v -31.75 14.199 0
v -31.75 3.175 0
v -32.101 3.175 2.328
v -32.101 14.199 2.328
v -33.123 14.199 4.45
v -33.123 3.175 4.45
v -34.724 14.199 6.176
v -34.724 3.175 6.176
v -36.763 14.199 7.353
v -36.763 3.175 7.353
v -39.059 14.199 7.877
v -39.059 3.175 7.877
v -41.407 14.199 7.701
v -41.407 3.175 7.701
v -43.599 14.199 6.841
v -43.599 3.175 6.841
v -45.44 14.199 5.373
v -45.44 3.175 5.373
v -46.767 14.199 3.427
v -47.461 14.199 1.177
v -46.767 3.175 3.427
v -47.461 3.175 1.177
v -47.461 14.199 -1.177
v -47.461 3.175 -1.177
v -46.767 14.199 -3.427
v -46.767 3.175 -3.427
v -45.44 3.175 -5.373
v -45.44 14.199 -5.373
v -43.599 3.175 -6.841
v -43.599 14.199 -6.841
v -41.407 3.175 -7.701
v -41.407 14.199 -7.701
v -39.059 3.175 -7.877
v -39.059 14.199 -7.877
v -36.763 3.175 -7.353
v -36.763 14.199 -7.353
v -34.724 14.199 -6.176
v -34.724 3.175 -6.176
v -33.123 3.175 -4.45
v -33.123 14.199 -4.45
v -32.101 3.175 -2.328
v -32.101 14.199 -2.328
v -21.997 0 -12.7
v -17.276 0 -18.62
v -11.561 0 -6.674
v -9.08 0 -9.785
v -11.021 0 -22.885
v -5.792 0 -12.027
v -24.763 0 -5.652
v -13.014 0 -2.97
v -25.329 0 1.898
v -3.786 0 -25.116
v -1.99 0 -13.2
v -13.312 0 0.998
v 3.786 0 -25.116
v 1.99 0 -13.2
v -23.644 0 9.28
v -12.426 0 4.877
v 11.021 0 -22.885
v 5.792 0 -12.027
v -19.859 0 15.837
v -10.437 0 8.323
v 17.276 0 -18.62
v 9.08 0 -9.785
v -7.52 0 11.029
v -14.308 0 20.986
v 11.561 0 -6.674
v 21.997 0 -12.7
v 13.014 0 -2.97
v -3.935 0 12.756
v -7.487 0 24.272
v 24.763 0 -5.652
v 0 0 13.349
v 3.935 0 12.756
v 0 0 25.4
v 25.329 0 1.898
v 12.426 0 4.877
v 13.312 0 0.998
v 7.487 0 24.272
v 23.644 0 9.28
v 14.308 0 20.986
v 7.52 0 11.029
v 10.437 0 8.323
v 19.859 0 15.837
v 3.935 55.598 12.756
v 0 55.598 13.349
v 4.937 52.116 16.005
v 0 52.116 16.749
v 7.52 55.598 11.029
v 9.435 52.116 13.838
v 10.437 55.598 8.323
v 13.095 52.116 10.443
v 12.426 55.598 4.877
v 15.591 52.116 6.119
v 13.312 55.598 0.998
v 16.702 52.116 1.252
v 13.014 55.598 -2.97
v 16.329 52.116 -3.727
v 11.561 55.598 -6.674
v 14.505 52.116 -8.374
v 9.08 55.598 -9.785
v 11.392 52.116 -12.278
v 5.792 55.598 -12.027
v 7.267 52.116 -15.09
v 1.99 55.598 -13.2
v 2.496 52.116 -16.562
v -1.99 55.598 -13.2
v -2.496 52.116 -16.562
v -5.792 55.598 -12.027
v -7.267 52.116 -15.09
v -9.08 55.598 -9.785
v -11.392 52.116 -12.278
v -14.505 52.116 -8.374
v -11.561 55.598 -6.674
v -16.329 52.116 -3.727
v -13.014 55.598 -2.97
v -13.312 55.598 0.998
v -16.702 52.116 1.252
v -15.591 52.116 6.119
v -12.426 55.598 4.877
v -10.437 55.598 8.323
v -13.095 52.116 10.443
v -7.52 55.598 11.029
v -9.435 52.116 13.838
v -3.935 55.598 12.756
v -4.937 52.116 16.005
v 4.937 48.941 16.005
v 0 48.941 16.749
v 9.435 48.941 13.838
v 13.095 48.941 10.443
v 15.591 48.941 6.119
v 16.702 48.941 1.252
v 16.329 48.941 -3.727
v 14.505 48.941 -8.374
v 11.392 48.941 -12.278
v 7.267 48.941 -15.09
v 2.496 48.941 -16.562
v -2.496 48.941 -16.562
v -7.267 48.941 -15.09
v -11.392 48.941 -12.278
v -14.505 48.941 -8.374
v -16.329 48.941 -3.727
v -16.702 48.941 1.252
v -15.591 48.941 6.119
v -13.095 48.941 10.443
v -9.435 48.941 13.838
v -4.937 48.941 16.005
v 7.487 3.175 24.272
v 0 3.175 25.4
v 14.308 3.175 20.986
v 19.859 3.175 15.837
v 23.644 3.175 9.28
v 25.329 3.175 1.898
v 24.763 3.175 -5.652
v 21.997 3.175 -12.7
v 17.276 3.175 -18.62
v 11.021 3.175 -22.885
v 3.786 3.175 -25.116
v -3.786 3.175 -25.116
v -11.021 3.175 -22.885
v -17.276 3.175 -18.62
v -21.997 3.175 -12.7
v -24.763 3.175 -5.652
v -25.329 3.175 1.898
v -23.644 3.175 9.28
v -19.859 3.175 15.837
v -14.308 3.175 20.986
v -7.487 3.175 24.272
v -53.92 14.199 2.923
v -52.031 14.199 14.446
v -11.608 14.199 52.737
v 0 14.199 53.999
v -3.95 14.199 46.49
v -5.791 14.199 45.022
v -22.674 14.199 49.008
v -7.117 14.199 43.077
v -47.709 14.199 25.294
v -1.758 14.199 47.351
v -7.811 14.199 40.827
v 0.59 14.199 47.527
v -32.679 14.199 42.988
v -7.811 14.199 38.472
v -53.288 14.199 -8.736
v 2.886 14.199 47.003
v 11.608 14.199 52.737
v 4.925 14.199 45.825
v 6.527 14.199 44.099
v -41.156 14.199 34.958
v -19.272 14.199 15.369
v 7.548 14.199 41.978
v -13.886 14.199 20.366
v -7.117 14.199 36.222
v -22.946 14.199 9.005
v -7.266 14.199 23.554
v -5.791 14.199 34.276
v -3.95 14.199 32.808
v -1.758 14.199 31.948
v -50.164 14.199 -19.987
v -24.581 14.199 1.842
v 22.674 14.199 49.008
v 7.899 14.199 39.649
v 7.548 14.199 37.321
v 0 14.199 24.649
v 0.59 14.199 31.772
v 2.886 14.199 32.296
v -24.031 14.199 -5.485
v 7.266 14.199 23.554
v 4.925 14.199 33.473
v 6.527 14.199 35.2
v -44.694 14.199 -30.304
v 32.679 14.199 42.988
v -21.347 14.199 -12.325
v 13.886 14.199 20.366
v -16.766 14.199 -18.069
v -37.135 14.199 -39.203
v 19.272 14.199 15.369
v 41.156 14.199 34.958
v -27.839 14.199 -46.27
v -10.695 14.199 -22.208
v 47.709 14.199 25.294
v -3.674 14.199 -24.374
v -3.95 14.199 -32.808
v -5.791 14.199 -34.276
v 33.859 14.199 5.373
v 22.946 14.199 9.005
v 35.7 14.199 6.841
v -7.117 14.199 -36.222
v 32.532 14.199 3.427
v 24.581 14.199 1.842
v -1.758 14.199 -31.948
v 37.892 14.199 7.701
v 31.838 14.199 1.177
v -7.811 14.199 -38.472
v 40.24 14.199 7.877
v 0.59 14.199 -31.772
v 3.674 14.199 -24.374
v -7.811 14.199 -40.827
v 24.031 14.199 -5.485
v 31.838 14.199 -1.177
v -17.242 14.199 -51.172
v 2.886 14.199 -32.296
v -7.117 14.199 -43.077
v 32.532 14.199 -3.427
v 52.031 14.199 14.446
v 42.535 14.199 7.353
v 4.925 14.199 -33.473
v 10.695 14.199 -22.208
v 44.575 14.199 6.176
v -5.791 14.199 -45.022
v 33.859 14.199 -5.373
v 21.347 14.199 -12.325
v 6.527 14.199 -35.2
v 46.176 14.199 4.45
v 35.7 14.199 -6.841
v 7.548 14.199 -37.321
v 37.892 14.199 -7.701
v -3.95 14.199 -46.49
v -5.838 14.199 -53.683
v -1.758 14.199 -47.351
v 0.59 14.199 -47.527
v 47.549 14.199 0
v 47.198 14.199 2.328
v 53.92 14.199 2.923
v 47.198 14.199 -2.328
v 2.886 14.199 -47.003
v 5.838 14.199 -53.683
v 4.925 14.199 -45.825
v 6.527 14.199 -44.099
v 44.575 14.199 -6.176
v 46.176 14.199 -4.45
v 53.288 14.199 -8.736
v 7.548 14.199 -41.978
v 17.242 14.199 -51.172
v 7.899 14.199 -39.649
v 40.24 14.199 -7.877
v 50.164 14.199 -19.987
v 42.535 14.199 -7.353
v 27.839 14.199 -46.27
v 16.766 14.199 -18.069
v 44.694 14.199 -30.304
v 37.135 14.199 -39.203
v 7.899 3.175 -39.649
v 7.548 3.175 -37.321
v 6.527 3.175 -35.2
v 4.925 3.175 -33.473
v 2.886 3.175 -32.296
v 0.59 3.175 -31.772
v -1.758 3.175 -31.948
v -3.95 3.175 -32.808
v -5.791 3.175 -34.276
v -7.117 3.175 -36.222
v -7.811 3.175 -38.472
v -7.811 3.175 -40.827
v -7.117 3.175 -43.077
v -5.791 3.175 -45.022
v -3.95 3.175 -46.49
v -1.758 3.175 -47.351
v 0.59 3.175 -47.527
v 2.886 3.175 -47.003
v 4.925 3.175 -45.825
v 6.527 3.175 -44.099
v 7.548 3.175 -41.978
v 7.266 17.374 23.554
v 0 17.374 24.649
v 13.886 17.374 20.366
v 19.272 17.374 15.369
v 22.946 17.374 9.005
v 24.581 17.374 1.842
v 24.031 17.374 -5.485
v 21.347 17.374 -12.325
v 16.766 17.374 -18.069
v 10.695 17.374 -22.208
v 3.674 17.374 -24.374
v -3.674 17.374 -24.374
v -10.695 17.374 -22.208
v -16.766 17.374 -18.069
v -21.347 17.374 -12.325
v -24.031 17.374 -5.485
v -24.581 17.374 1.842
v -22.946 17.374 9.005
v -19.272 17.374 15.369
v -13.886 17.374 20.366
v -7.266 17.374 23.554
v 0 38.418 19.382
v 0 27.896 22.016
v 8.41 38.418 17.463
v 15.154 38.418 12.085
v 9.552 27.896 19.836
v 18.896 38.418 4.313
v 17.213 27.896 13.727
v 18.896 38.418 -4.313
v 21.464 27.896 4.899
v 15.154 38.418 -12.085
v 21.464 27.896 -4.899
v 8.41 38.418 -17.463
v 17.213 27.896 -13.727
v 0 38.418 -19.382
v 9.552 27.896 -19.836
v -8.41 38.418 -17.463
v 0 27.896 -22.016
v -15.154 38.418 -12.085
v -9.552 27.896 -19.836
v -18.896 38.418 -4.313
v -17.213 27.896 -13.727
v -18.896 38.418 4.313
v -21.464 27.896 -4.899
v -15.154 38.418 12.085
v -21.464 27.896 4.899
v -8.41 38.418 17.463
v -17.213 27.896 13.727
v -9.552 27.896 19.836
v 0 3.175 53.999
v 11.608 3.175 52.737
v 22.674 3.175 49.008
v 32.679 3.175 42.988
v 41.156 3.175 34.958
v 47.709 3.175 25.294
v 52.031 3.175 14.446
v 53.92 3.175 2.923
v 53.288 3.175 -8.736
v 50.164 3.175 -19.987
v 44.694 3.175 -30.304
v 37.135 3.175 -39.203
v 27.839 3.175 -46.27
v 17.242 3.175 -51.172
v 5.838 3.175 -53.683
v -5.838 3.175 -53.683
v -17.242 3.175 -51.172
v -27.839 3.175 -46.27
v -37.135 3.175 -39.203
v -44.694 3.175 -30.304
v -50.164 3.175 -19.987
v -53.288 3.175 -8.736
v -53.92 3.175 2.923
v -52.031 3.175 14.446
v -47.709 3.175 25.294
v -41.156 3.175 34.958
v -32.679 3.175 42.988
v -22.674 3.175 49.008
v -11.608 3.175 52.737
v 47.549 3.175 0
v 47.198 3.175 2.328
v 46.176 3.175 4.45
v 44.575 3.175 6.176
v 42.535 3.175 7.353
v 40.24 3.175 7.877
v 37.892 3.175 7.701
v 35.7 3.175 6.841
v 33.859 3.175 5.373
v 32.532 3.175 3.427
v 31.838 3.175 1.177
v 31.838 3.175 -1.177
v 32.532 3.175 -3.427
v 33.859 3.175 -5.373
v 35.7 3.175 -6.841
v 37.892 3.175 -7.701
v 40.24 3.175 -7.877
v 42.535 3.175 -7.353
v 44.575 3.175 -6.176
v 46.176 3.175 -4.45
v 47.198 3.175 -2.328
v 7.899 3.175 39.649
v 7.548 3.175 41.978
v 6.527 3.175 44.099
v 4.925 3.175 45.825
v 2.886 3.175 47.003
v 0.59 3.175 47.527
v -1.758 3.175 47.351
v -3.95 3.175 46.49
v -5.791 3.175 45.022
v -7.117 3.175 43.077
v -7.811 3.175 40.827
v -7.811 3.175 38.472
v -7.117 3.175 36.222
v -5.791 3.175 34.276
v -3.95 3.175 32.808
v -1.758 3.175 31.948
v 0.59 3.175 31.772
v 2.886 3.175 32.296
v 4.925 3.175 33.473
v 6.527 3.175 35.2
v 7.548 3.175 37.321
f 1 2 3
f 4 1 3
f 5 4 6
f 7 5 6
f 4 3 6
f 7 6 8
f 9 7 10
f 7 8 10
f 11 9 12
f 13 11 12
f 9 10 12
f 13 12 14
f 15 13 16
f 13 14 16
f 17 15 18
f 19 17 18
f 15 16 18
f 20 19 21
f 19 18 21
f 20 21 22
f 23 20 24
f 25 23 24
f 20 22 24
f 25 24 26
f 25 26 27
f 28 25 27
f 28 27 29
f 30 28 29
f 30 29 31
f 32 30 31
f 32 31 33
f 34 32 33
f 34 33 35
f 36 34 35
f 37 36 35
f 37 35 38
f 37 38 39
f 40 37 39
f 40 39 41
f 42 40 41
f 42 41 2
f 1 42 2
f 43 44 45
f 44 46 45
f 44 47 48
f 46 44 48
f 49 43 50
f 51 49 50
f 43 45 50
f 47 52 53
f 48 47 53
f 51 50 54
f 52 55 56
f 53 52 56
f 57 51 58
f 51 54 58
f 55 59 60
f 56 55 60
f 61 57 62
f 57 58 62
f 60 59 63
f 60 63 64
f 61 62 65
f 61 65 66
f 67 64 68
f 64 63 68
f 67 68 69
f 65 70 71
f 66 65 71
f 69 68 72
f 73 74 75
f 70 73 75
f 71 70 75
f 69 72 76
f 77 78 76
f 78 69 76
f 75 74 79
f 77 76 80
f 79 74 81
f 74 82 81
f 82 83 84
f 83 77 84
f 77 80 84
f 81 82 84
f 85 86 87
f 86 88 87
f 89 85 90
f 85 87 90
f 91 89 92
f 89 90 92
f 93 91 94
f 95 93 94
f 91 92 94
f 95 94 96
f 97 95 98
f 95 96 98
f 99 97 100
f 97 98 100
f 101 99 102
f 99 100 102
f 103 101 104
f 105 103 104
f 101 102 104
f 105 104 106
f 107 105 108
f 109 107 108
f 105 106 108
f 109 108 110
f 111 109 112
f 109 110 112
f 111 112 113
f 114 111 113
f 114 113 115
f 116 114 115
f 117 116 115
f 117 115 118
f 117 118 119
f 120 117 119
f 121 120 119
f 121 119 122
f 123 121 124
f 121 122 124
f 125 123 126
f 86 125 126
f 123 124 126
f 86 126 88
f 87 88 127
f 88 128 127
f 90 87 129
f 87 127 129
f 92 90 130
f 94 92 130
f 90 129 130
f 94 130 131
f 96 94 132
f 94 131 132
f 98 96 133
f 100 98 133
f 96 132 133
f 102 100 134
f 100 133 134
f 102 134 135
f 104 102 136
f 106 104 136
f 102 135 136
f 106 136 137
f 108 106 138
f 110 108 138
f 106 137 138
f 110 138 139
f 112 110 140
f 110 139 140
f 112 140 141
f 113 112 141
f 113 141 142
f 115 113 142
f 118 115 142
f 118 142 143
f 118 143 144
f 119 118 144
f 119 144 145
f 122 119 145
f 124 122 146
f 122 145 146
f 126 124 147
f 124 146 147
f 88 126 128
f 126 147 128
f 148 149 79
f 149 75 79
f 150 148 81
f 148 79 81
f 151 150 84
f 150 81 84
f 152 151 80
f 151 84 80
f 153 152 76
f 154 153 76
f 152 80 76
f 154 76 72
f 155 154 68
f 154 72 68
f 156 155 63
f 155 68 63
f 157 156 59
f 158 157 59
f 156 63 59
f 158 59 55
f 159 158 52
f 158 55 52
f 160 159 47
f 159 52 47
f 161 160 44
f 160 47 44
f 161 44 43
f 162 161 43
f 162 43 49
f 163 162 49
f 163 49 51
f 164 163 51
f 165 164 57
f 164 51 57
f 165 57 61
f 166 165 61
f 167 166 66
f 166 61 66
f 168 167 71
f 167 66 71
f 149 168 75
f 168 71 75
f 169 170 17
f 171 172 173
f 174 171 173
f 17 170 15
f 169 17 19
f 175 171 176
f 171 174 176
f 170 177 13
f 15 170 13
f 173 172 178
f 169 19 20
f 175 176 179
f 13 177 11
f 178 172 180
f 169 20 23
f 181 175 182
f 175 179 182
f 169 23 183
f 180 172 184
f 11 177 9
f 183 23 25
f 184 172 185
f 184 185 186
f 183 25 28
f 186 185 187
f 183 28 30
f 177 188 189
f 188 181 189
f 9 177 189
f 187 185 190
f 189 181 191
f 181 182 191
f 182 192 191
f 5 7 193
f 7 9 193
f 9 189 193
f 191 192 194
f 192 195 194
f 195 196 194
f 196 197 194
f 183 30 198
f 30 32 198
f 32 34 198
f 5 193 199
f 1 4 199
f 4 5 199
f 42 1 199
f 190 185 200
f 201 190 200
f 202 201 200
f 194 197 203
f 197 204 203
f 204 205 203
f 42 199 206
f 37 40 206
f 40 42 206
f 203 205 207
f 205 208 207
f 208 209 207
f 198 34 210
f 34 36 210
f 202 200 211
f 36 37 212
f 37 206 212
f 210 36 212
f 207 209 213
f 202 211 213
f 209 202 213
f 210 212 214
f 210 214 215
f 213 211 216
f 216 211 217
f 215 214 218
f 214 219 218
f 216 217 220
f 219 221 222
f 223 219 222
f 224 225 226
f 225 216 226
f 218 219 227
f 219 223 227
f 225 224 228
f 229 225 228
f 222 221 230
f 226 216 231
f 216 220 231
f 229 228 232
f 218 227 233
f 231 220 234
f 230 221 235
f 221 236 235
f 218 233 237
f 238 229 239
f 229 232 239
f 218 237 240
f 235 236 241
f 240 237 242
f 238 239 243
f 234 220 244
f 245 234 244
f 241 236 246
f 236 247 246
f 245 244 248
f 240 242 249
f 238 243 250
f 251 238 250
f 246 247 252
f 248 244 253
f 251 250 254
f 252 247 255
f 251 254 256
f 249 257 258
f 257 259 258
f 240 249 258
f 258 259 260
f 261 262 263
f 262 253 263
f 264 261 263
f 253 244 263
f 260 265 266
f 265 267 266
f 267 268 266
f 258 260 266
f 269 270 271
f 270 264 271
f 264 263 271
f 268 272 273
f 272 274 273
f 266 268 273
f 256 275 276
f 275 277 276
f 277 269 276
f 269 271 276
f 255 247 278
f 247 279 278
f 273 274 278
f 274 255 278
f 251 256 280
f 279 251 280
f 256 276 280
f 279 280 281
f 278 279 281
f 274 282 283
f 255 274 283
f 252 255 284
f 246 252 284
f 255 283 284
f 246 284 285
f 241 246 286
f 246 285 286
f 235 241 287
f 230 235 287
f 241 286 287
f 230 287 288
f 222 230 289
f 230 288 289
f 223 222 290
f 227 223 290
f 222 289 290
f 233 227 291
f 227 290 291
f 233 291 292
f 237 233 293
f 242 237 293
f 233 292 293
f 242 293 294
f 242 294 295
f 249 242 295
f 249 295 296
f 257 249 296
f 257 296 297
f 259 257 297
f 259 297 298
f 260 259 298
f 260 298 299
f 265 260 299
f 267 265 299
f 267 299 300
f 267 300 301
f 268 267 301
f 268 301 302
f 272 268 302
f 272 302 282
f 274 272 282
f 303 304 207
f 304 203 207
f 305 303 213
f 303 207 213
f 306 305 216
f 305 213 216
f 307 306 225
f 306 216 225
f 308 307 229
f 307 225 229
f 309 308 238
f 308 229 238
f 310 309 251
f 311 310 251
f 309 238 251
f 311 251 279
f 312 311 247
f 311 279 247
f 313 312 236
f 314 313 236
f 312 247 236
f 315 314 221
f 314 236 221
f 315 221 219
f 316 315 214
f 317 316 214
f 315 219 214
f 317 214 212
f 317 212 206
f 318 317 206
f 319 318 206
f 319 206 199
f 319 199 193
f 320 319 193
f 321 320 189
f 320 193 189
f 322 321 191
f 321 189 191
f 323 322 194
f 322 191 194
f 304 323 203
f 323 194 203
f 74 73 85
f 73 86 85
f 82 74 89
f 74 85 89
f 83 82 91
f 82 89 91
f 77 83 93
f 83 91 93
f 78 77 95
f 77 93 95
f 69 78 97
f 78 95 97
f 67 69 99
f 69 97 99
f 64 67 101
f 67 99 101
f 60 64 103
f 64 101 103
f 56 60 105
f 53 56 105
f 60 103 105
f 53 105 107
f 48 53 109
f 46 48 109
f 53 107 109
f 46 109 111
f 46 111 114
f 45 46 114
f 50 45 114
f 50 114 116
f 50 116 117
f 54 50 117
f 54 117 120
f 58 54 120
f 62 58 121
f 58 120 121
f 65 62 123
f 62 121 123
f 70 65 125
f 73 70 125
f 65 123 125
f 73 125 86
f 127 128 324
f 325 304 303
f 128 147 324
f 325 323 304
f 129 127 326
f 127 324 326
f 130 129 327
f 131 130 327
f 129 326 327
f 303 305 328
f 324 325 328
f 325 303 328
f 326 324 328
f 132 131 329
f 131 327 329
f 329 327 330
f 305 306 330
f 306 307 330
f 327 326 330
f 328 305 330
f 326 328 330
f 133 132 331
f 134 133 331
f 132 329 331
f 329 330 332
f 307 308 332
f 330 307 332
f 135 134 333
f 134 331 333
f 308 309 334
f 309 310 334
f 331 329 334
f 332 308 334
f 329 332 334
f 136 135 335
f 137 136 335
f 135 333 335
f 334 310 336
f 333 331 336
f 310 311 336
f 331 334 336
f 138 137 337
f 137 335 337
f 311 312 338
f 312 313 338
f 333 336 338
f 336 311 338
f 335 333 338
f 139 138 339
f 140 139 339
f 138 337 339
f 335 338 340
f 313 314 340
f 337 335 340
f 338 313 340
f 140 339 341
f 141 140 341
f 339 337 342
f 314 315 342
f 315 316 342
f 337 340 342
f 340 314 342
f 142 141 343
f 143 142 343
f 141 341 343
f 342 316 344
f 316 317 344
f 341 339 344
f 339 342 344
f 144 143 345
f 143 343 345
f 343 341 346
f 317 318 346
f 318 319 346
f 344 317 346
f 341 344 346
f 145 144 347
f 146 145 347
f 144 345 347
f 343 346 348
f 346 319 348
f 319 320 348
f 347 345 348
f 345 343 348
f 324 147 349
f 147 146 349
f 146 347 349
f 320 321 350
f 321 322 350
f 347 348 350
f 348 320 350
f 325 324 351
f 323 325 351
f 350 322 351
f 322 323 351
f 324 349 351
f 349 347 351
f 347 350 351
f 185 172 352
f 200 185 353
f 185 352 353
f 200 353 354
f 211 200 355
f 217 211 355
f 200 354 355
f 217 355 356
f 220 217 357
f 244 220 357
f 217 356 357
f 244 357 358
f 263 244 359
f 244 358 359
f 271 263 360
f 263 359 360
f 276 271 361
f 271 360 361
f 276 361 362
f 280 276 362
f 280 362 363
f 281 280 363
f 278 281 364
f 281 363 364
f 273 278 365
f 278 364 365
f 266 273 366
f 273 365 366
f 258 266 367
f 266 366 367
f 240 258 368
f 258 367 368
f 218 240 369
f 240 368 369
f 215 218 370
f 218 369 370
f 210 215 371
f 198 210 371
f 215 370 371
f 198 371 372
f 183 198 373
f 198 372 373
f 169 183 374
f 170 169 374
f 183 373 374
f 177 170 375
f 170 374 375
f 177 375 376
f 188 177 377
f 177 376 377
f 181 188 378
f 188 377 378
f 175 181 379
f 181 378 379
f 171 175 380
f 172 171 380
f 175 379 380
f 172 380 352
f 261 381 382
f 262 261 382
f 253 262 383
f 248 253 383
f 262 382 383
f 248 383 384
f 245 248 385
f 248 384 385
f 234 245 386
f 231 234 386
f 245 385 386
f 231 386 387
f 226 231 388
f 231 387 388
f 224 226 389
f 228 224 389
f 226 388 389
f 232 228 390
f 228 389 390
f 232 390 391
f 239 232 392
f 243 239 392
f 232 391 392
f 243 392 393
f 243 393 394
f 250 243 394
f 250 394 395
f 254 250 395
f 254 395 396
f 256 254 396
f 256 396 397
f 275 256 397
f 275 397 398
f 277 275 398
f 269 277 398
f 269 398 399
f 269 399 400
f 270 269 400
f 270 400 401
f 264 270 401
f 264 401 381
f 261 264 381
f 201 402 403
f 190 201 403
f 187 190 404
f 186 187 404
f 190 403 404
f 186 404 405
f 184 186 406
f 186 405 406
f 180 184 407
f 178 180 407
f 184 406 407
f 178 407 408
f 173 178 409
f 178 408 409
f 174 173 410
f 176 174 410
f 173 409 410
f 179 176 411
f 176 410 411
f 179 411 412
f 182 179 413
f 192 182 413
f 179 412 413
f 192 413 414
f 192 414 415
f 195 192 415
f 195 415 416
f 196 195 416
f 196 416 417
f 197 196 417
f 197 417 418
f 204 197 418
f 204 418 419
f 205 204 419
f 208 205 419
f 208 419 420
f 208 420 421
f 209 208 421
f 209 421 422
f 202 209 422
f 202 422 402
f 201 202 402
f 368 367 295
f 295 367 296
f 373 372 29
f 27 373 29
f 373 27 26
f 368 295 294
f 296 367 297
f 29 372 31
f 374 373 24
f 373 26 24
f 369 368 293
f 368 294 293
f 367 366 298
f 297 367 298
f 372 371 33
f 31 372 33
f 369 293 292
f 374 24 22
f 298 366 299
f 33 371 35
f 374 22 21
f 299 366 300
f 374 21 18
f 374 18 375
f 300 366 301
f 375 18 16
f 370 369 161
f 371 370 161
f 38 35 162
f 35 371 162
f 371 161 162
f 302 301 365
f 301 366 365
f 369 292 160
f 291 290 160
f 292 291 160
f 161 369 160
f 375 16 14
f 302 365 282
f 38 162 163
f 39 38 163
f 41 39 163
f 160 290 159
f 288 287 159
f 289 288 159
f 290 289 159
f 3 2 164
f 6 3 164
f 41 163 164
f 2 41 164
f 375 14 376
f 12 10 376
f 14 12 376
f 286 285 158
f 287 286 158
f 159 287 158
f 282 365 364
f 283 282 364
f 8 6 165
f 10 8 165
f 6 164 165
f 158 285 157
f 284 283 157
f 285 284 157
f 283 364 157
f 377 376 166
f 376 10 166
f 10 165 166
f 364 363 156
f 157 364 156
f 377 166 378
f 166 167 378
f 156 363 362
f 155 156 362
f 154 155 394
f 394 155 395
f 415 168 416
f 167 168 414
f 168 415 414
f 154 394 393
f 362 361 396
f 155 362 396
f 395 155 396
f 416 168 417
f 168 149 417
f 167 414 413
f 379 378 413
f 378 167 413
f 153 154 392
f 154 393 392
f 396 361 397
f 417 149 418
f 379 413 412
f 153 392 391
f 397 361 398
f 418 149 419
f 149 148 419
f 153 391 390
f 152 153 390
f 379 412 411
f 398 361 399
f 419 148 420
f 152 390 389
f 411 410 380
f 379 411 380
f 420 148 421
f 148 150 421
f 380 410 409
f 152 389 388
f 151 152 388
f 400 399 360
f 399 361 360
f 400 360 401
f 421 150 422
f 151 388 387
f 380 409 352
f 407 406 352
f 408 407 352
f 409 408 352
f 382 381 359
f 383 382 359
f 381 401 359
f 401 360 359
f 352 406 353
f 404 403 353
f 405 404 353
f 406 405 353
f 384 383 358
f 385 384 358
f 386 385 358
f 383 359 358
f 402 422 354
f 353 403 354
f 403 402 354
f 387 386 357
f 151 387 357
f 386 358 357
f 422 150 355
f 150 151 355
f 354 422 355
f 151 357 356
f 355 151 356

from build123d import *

# Parameters (mm, degrees)
F2_R     = 7.8994
F3_DEPTH = 52.42406


with BuildPart() as f1:
    # F0 (on Right) → F1 (revolve)
    with BuildSketch(Plane.YZ):
        Polygon((0, 25.4), (0, 13.34897), (55.59806, 13.34897), (52.115666, 16.74876), (48.940666, 16.74876), (17.3736, 24.64943), (14.1986, 24.64943), (14.1986, 53.99913), (3.175, 53.99913), (3.175, 25.4), align=None)
    revolve(axis=Axis((0, -0.429692, 0), (0, 1, 0)))

    # F2 (on face) → F3 (cut, through all)
    with BuildSketch(Plane.XZ.offset(-3.175)):
        with Locations((0, 39.6494)):
            Circle(F2_R)
        with Locations((-39.6494, 0)):
            Circle(F2_R)
        with Locations((0, -39.6494)):
            Circle(F2_R)
        with Locations((39.6494, 0)):
            Circle(F2_R)
    extrude(amount=-F3_DEPTH, mode=Mode.SUBTRACT)


solid = f1.part
